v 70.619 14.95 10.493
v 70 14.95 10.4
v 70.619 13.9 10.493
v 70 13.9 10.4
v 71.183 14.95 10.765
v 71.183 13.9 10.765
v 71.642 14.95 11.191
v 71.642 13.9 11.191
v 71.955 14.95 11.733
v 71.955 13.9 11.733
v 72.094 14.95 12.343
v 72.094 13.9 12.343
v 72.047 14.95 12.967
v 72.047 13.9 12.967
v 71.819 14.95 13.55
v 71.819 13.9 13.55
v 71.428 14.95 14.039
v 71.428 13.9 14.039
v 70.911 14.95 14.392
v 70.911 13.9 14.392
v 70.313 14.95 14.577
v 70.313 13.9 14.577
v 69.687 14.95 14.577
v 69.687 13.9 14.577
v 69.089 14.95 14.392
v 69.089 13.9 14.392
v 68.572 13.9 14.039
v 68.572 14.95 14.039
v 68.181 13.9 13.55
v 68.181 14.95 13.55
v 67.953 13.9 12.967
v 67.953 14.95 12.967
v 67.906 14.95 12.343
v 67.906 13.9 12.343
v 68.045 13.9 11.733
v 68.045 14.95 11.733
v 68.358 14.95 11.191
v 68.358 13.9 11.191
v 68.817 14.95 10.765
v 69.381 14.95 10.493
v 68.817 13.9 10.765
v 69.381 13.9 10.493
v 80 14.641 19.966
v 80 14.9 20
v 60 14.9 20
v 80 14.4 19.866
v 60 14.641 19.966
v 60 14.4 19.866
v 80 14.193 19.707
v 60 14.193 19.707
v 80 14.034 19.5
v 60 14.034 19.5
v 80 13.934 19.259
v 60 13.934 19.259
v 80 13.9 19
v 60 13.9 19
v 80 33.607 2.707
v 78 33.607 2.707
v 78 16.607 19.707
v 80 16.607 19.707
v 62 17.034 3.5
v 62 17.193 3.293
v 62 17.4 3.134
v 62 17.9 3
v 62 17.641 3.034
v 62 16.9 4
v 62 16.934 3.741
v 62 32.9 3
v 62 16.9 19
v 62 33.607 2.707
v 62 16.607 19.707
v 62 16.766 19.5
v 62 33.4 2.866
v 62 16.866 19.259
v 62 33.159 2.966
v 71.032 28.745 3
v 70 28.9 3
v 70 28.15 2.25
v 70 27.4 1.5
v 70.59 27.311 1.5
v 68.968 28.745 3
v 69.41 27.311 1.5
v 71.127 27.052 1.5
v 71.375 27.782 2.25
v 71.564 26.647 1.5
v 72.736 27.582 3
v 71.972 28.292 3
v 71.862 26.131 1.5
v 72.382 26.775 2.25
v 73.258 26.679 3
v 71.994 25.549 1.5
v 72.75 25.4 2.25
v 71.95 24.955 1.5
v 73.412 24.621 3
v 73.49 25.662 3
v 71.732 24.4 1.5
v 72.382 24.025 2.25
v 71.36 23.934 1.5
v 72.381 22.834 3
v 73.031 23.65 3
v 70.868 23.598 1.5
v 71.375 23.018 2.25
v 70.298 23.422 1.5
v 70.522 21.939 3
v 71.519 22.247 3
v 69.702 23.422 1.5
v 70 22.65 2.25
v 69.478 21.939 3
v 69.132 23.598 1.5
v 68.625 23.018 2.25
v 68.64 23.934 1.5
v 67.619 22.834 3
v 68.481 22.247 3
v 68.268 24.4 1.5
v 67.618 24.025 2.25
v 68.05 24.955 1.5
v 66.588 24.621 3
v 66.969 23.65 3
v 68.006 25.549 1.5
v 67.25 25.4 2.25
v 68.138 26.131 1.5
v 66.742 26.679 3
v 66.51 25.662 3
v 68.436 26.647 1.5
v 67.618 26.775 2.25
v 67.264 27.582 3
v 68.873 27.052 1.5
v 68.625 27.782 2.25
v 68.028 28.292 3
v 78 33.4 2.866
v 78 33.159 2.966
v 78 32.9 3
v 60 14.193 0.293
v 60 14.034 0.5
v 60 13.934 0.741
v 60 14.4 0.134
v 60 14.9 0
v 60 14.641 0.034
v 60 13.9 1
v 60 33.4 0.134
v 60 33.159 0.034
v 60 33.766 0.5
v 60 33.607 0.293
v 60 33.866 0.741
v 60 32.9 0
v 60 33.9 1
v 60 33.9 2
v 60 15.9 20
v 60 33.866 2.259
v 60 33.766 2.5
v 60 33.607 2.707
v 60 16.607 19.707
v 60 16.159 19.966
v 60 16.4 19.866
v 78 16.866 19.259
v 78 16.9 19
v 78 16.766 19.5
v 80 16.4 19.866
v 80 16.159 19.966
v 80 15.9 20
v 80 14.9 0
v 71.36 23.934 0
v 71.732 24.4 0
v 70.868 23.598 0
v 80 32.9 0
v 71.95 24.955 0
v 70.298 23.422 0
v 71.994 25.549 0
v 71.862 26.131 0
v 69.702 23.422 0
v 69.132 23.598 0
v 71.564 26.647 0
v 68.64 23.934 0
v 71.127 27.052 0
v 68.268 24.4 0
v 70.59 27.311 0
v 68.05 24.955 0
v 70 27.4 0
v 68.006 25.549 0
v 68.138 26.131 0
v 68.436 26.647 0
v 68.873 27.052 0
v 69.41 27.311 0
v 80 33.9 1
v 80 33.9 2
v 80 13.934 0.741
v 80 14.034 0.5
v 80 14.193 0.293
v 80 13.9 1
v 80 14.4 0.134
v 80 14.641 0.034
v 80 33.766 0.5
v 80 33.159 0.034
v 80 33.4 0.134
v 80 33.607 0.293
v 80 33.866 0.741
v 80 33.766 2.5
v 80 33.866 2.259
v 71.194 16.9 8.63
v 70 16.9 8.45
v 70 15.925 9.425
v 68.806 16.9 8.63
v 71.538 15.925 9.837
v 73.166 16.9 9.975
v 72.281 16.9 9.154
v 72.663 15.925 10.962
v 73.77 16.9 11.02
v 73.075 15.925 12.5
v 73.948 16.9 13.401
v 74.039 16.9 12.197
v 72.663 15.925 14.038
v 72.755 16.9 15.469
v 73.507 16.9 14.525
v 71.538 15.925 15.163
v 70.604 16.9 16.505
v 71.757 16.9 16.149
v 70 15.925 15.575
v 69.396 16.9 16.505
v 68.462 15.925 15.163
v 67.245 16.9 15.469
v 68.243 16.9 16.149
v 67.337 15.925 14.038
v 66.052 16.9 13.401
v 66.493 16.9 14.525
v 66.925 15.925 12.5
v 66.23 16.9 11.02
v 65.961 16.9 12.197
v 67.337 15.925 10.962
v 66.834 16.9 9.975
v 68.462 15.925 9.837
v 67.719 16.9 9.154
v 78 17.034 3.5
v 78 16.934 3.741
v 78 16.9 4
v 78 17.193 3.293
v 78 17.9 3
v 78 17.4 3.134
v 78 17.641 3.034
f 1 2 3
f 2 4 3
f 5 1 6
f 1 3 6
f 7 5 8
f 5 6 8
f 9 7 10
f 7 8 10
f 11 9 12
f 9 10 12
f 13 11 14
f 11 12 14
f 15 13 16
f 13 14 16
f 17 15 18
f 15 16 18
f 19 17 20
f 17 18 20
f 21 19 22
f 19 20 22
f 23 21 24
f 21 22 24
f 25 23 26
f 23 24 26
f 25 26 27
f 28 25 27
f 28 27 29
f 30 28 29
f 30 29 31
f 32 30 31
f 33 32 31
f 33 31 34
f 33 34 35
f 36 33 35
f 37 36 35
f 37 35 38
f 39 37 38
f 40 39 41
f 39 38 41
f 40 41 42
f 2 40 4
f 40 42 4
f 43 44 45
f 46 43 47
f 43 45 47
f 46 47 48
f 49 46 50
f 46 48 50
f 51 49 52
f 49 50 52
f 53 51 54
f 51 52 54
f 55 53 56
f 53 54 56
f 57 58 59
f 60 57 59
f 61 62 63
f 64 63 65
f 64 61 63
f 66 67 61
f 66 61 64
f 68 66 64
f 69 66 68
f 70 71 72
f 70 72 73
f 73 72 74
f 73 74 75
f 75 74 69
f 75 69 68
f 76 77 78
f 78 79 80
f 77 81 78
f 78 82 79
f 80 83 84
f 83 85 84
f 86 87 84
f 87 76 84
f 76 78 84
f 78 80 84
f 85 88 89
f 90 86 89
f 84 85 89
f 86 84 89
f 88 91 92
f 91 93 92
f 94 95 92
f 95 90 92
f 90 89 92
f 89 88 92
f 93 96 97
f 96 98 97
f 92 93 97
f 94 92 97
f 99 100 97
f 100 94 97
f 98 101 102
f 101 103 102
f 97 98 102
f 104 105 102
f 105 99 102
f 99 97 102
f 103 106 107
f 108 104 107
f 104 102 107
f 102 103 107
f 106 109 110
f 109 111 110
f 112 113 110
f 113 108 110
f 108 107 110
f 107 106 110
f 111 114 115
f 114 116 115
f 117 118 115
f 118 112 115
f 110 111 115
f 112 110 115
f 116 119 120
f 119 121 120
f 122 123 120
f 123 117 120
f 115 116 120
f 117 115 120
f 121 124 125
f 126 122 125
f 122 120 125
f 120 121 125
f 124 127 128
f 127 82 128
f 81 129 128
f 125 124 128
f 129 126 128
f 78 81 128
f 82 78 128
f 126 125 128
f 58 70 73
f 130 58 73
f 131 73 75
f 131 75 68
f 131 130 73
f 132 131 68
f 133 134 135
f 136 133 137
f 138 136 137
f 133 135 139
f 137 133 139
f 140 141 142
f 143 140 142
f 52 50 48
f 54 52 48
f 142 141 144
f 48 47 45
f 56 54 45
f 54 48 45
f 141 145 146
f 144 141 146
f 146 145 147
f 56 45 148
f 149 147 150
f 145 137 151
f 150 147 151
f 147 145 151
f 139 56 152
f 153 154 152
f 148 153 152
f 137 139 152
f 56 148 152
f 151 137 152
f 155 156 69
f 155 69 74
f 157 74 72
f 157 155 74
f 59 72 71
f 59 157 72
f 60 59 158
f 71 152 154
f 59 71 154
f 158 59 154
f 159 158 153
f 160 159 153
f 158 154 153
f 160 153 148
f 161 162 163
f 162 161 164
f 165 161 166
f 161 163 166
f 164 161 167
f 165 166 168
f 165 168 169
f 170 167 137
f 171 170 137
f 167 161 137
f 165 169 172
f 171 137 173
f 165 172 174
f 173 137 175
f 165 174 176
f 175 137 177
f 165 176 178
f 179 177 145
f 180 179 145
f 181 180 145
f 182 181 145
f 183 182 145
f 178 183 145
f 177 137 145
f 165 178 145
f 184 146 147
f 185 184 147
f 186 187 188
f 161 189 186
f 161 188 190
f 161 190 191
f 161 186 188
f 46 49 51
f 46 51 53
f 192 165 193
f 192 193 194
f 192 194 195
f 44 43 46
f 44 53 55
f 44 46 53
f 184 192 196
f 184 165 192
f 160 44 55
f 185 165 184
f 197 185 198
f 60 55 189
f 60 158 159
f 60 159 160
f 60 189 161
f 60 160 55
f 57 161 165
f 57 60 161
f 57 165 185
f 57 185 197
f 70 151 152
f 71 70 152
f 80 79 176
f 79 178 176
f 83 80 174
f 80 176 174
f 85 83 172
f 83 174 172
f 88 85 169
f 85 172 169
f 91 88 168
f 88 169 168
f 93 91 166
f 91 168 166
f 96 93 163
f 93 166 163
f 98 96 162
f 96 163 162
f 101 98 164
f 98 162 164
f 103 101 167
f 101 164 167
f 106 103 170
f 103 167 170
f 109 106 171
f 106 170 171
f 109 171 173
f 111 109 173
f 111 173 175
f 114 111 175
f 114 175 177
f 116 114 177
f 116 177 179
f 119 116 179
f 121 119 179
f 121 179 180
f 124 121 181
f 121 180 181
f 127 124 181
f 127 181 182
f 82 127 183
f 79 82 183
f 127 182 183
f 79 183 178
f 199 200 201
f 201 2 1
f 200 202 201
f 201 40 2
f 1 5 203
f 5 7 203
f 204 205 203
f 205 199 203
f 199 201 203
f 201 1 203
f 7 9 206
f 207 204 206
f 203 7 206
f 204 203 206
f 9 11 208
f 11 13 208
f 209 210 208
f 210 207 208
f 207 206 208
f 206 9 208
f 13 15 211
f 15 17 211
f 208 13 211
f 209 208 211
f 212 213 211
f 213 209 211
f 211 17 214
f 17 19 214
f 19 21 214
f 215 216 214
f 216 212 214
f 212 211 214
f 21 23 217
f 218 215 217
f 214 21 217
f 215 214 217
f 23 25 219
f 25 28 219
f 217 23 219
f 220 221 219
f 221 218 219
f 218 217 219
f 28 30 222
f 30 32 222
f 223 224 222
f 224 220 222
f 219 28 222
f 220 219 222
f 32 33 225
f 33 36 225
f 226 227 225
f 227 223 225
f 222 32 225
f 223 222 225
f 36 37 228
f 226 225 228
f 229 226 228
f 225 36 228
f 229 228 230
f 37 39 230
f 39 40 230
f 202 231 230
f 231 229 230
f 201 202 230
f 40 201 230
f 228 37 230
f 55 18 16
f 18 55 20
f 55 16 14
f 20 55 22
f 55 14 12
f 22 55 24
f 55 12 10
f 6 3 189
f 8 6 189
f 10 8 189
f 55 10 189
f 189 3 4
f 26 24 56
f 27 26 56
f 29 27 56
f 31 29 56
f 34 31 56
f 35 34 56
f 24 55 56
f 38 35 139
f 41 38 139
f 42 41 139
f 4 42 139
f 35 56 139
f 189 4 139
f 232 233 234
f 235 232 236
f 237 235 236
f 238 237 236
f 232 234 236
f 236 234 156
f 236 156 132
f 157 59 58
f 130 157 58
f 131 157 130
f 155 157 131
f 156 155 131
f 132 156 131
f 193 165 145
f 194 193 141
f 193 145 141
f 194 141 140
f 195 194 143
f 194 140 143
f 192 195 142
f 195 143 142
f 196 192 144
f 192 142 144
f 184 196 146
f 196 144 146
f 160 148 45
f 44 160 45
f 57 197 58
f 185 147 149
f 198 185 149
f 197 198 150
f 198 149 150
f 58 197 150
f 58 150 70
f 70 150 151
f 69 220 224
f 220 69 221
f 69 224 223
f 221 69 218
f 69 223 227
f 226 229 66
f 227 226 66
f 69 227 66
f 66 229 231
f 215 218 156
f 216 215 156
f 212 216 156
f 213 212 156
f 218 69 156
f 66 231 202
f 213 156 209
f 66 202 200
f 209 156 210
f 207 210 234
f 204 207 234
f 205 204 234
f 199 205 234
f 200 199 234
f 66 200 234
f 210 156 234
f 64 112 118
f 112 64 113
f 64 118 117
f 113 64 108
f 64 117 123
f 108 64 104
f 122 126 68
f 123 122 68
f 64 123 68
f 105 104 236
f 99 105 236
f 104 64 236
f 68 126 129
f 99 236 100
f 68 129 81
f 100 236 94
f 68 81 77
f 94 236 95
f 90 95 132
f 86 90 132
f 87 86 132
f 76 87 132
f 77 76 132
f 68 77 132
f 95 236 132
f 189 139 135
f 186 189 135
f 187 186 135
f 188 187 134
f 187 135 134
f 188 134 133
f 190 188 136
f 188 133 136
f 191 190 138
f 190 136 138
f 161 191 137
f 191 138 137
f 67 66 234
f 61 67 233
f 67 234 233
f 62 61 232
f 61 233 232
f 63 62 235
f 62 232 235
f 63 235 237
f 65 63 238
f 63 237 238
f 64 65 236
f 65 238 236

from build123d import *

# Parameters (mm, degrees)
PAD_DEPTH            = 20
POCKET_DEPTH         = 16
HOLE_D               = 4
HOLE_CSINK_D         = 7
HOLE_CSINK_ANGLE     = 90
HOLE001_D            = 4.2
HOLE001_DEPTH        = 25
HOLE001_CSINK_D      = 8.1
HOLE001_CSINK_ANGLE  = 90
BODY_PLACEMENT_ANGLE = 90


with BuildPart() as part:
    # Sketch → Pad (new body)
    with BuildSketch(Plane.XZ):
        with BuildLine():
            Line((0, 19), (0, 1))
            ThreePointArc((0, 1), (0.292893, 0.292893), (1, 0))
            Line((1, 0), (19, 0))
            ThreePointArc((19, 0), (19.707107, 0.292893), (20, 1))
            Line((20, 1), (20, 2))
            ThreePointArc((20, 2), (19.92388, 2.382683), (19.707107, 2.707107))
            Line((19.707107, 2.707107), (2.707107, 19.707107))
            ThreePointArc((2.707107, 19.707107), (2.382683, 19.92388), (2, 20))
            Line((2, 20), (1, 20))
            ThreePointArc((1, 20), (0.292893, 19.707107), (0, 19))
        make_face()
    extrude(amount=PAD_DEPTH)

    # Sketch001 (on Face12 of Pad) → Pocket (cut)
    with BuildSketch(Plane.XZ.offset(18)):
        with BuildLine():
            Line((3, 19), (3, 4))
            ThreePointArc((3, 4), (3.292893, 3.292893), (4, 3))
            Line((4, 3), (19, 3))
            ThreePointArc((20, 2), (19.707107, 2.707107), (19, 3))
            Line((20, 20), (20, 2))
            Line((2, 20), (20, 20))
            ThreePointArc((3, 19), (2.707107, 19.707107), (2, 20))
        make_face()
    extrude(amount=-POCKET_DEPTH, mode=Mode.SUBTRACT)

    # Hole (through all)
    with Locations(Plane(origin=(0, 0, 3), x_dir=(-1, 0, 0), z_dir=(0, 0, 1))):
        with Locations((-11.5, 10)):
            CounterSinkHole(HOLE_D / 2, HOLE_CSINK_D / 2, counter_sink_angle=HOLE_CSINK_ANGLE)

    # Hole001
    with Locations(Plane(origin=(3, 0, 0), x_dir=(0, 0, 1), z_dir=(1, 0, 0))):
        with Locations((12.5, 10)):
            CounterSinkHole(HOLE001_D / 2, HOLE001_CSINK_D / 2, depth=HOLE001_DEPTH, counter_sink_angle=HOLE001_CSINK_ANGLE)


with BuildPart() as part_1:
    # Body placement: moved
    add(part.part.moved(Location((60, 13.9, 0))).rotate(Axis((60, 13.9, 0), (0, 0, 1)), BODY_PLACEMENT_ANGLE))


solid = part_1.part
